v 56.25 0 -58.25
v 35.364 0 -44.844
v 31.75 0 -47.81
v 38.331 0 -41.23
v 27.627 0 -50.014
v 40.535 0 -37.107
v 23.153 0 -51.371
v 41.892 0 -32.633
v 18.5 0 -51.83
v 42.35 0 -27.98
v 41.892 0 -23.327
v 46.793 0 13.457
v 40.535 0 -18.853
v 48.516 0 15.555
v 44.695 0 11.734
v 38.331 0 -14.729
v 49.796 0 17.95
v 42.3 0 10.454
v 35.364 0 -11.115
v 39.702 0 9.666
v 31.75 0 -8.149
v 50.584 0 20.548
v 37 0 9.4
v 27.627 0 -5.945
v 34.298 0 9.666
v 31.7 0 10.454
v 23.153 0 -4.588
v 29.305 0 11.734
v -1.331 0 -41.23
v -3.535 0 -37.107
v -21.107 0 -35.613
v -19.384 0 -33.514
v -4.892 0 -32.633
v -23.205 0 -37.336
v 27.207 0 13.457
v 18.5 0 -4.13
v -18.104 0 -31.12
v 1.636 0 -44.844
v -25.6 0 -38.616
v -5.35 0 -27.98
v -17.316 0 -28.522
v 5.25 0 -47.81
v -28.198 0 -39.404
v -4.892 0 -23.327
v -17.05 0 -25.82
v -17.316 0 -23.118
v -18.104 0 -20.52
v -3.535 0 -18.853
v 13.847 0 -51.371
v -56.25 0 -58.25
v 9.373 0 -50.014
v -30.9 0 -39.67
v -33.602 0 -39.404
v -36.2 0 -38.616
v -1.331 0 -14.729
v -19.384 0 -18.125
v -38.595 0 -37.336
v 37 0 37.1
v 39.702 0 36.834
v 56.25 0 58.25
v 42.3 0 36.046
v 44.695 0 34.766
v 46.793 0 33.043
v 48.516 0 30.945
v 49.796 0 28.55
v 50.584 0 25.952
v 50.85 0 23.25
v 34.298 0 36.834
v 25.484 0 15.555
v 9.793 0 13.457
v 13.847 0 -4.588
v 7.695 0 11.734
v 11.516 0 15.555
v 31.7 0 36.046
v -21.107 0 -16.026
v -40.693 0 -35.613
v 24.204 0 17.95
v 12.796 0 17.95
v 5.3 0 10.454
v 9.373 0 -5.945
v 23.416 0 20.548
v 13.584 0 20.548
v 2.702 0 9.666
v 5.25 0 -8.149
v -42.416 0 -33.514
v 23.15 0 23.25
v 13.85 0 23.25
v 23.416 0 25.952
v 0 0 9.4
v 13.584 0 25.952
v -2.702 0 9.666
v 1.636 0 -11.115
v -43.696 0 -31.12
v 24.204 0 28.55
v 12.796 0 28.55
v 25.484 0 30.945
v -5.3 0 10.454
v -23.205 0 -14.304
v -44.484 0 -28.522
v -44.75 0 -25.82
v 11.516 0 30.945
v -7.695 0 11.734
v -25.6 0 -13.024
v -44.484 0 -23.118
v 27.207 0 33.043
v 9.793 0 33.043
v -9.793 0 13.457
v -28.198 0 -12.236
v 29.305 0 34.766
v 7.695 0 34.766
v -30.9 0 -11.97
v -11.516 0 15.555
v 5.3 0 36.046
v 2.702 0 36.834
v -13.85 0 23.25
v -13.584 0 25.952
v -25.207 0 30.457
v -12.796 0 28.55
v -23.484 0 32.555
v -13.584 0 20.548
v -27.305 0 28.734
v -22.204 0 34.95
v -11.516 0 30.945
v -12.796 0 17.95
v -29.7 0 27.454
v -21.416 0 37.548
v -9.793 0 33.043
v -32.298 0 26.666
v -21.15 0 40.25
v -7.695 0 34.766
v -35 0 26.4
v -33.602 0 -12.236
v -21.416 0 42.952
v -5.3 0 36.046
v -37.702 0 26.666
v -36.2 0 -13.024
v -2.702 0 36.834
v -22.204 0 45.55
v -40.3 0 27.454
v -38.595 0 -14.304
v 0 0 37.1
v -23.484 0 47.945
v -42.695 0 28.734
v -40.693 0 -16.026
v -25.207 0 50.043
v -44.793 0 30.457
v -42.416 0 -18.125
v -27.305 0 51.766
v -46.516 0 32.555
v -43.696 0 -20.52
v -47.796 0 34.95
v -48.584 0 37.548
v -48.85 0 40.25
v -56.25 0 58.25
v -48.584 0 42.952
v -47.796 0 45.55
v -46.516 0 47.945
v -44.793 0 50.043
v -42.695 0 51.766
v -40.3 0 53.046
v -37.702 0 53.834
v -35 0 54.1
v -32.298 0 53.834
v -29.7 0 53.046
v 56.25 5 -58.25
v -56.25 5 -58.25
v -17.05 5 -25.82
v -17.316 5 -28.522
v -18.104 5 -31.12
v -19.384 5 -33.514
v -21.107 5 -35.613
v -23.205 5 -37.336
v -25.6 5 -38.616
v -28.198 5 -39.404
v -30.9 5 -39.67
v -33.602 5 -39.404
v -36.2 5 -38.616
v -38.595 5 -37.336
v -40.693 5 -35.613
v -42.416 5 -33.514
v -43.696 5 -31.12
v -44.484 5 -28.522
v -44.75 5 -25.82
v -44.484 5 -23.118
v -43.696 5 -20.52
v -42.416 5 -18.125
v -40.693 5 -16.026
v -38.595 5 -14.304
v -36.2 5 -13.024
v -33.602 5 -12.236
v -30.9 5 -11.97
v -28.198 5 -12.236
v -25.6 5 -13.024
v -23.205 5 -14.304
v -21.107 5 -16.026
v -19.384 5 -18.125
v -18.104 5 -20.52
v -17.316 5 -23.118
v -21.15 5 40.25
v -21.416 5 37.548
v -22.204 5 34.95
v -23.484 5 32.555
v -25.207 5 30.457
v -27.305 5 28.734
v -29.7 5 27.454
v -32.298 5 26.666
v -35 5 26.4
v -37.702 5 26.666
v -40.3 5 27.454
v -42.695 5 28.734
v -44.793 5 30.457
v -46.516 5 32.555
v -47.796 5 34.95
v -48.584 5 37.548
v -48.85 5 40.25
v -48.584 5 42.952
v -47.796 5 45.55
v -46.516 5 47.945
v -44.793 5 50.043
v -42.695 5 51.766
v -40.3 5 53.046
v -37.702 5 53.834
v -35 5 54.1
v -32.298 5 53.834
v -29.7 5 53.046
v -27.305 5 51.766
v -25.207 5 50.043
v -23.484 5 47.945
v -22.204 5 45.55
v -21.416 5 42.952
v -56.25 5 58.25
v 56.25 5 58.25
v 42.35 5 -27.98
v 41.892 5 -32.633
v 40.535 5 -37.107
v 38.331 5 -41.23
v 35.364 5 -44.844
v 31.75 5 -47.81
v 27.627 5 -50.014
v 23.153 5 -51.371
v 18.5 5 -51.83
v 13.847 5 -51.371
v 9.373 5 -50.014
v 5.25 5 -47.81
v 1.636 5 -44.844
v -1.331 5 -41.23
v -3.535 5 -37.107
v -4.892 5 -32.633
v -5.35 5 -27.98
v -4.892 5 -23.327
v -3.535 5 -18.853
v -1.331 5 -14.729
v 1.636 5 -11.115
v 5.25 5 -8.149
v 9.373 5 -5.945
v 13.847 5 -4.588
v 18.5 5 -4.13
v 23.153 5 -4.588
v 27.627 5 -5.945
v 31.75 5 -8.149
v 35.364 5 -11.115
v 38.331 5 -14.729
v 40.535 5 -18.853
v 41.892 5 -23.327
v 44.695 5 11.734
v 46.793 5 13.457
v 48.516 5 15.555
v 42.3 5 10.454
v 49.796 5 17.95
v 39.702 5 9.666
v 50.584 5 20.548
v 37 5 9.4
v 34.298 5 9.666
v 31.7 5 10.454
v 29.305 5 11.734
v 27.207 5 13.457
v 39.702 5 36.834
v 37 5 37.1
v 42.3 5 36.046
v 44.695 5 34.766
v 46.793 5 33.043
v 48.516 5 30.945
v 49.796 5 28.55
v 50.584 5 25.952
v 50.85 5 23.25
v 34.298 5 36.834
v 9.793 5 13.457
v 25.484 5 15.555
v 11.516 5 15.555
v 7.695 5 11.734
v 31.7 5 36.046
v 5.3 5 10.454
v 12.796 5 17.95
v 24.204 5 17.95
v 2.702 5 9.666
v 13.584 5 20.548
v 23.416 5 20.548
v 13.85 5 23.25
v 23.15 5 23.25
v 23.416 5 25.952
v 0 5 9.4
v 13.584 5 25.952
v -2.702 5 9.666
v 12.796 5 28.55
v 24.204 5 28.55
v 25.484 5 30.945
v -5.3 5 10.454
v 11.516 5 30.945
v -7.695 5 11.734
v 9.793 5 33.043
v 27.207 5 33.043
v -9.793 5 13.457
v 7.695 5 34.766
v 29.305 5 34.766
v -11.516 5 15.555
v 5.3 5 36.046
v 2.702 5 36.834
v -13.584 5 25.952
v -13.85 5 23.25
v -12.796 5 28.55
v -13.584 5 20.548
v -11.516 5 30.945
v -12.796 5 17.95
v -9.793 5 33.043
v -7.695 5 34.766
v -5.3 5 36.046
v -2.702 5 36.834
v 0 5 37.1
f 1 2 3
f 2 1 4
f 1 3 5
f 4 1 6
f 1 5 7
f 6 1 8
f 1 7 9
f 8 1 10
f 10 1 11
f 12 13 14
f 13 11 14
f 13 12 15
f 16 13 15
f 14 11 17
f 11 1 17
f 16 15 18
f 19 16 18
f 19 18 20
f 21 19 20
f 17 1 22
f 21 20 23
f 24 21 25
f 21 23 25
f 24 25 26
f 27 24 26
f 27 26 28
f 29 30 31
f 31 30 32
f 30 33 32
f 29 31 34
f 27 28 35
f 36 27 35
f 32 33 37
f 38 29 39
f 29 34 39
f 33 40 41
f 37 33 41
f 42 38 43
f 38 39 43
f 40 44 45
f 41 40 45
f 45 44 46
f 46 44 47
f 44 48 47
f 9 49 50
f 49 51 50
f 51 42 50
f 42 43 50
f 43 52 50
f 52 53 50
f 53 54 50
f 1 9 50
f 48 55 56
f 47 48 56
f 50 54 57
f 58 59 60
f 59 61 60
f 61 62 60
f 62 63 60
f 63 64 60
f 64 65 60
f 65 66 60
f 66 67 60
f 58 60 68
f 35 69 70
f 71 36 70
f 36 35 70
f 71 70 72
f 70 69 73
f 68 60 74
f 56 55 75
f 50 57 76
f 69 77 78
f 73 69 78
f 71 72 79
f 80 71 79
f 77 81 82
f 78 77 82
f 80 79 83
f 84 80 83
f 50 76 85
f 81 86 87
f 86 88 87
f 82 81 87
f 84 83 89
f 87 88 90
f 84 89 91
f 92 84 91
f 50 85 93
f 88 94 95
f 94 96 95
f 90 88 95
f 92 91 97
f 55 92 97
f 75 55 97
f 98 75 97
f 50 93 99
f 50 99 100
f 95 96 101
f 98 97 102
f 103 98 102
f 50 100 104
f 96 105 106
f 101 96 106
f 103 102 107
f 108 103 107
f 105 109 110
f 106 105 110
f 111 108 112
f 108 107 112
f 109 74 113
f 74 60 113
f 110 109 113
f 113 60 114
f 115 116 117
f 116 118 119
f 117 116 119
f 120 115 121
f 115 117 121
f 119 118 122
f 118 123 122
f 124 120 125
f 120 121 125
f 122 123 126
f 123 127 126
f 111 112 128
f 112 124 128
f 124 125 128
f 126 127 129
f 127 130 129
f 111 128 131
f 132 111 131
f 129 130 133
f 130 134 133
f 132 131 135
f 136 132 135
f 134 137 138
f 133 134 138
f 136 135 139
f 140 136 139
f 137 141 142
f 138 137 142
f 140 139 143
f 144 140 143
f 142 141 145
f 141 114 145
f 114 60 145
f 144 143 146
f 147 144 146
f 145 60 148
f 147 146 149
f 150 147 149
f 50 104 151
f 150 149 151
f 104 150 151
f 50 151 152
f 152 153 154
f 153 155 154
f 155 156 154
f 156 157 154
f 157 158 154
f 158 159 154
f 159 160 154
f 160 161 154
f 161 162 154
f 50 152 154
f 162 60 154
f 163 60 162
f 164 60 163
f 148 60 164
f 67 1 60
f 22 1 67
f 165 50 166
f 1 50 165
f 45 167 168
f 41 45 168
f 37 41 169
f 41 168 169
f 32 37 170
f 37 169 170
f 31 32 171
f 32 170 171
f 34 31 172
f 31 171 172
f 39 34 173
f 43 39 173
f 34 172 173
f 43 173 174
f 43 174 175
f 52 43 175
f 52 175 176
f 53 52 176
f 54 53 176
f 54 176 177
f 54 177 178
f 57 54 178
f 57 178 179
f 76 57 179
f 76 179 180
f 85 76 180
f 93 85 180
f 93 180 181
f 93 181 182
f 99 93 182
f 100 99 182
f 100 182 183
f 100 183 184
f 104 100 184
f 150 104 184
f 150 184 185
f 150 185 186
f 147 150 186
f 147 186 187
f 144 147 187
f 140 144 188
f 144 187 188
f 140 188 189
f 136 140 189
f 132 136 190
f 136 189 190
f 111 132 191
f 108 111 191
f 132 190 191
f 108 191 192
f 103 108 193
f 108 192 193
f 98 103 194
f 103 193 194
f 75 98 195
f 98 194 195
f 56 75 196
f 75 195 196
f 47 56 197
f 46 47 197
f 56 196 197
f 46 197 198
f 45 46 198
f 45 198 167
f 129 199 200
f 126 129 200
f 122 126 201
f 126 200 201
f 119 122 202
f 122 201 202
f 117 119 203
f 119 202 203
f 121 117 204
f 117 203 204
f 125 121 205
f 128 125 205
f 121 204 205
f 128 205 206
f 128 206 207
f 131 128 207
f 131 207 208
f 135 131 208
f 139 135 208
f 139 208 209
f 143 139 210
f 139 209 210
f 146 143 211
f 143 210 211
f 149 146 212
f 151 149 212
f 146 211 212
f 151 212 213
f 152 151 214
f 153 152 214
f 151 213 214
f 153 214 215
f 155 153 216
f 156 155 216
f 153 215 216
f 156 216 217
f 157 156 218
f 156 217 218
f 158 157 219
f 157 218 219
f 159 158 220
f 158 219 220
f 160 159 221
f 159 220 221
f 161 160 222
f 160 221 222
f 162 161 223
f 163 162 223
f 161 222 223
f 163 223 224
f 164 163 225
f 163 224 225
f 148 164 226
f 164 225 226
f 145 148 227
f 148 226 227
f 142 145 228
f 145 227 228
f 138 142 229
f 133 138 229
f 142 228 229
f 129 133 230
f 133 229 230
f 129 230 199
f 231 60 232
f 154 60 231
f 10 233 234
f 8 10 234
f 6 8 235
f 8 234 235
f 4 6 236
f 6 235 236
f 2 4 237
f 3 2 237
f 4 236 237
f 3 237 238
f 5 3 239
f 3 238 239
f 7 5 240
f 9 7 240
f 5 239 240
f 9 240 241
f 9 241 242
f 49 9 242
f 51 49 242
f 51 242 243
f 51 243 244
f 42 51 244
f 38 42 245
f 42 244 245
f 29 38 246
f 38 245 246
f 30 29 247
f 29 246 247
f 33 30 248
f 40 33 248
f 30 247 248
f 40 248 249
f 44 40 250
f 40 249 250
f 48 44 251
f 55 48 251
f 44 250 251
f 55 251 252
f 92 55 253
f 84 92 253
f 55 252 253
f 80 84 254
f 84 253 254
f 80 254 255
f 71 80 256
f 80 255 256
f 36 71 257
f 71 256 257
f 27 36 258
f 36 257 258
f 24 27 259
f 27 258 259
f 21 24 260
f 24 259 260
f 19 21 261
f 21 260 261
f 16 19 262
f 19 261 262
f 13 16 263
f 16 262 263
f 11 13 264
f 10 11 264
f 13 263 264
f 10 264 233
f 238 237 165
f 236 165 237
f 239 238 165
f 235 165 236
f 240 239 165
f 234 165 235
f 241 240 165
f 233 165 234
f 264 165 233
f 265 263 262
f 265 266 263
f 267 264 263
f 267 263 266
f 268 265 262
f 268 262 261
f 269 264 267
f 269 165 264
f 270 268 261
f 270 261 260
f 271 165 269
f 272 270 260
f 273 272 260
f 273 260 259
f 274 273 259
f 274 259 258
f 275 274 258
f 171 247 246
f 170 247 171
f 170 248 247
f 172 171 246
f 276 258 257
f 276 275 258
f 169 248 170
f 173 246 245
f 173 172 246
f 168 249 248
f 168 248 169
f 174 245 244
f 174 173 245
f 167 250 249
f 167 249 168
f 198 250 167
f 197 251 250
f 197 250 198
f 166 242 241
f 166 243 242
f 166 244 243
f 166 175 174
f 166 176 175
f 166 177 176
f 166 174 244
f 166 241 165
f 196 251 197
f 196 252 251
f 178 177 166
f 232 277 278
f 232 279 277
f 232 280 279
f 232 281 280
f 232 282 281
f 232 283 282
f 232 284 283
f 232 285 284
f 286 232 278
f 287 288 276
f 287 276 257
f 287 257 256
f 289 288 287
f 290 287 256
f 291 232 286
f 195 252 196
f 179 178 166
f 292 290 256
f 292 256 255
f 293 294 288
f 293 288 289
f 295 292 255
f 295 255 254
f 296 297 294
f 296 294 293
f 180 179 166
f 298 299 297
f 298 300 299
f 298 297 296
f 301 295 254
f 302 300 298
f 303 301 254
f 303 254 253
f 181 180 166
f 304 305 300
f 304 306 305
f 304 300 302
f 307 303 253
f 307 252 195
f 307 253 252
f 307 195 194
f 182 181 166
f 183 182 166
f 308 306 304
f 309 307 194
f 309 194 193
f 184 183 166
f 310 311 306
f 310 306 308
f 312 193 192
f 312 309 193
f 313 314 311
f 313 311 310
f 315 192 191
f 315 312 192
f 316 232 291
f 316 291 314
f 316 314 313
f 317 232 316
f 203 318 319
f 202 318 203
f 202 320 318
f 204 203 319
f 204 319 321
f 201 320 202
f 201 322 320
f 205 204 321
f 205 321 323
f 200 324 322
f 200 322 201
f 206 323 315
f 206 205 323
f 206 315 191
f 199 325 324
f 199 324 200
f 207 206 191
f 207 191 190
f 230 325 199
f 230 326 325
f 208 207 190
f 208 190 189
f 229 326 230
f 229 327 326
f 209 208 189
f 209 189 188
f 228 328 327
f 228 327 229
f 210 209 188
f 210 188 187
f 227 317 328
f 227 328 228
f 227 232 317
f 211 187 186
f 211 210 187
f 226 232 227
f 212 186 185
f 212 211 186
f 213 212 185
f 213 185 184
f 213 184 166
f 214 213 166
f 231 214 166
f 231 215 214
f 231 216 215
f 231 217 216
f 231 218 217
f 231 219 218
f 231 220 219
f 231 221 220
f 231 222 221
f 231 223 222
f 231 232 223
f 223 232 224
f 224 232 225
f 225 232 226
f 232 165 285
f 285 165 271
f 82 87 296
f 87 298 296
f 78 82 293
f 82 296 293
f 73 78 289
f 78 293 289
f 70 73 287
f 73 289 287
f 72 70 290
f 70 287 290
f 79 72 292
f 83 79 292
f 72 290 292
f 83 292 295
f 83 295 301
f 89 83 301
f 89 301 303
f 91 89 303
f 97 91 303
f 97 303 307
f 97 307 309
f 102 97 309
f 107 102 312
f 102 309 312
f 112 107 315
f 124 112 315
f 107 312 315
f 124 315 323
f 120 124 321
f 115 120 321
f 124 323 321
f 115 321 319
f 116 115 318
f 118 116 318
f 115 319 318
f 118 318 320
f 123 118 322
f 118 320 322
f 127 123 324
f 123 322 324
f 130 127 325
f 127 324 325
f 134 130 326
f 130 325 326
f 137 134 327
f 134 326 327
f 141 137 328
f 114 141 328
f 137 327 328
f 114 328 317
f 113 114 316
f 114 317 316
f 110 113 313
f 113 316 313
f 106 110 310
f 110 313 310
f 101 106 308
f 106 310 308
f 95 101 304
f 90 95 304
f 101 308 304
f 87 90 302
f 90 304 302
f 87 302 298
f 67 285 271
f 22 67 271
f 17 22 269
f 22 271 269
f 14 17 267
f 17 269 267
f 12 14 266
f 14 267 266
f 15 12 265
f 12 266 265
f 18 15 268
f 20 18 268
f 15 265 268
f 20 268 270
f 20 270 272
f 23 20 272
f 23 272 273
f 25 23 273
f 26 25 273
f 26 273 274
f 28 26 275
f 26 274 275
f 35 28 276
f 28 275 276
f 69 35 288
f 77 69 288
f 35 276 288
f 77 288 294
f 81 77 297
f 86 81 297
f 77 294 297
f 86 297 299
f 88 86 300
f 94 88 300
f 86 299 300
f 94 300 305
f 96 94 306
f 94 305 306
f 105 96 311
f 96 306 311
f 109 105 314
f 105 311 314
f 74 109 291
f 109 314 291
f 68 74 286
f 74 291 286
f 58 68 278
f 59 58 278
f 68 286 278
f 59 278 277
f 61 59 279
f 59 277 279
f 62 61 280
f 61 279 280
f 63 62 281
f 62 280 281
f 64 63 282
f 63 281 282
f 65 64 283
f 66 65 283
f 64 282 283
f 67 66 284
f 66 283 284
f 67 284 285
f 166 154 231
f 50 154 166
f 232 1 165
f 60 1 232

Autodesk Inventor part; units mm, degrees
ref_plane "YZ Plane" through (0, 0, 0) normal (1, 0, 0) x (0, 1, 0)
ref_plane "XZ Plane" through (0, 0, 0) normal (0, 1, 0) x (-1, 0, 0)
ref_plane "XY Plane" through (0, 0, 0) normal (0, 0, 1) x (1, 0, 0)
sketch "Sketch1" plane through (0, 0, 0) normal (0, 1, 0) x (-1, 0, 0)
  line L0 (-56.25, 58.25) -> (56.25, 58.25)
  line L1 (56.25, 58.25) -> (56.25, -58.25)
  line L2 (56.25, -58.25) -> (-56.25, -58.25)
  line L3 (-56.25, -58.25) -> (-56.25, 58.25)
  line L4 (-56.25, 58.25) -> (56.25, -58.25) construction
  line L5 (56.25, 58.25) -> (-56.25, -58.25) construction
  point P0 (0, 0)
  dimension "d0" = 112.5
  dimension "d1" = 116.5
extrude "Extrusion1" add sketch "Sketch1" along normal blind 5
sketch "Sketch2" plane through (0, 5, 0) normal (0, 1, 0) x (1, 0, 0)
  circle A0 centre (18.5, 27.9796) radius 23.85
  circle A1 centre (37, -23.25) radius 13.85
  circle A2 centre (-35, -40.25) radius 13.85
  circle A3 centre (-30.9, 25.8198) radius 13.85
  circle A4 centre (0, -23.25) radius 13.85
  line L0 (56.25, 58.25) -> (-56.25, 58.25) projected
  line L1 (-56.25, -58.25) -> (56.25, -58.25) projected
  line L2 (0, -105.9299) -> (0, 123.2086) construction
  line L3 (-76.4777, -40.25) -> (-5.35, -40.25) construction
  line L4 (-123.5447, -23.25) -> (82.5572, -23.25) construction
  line L5 (56.25, -58.25) -> (56.25, 58.25) construction
  point P0 (0, 0)
  dimension "d4" = 47.7
  dimension "d5" = 27.7
  dimension "d6" = 27.7
  dimension "d7" = 27.7
  dimension "d8" = 27.7
  dimension "d9" = 116.5
  dimension "d10" = 112.5
  dimension "d13" = 37
  dimension "d14" = 18.5
  dimension "d15" = 30.9
  dimension "d18" = 18
  dimension "d19" = 35
  dimension "d20" = 35
extrude "Extrusion2" cut sketch "Sketch2" against normal blind 5
properties part number "Bottle layout lower plate"
